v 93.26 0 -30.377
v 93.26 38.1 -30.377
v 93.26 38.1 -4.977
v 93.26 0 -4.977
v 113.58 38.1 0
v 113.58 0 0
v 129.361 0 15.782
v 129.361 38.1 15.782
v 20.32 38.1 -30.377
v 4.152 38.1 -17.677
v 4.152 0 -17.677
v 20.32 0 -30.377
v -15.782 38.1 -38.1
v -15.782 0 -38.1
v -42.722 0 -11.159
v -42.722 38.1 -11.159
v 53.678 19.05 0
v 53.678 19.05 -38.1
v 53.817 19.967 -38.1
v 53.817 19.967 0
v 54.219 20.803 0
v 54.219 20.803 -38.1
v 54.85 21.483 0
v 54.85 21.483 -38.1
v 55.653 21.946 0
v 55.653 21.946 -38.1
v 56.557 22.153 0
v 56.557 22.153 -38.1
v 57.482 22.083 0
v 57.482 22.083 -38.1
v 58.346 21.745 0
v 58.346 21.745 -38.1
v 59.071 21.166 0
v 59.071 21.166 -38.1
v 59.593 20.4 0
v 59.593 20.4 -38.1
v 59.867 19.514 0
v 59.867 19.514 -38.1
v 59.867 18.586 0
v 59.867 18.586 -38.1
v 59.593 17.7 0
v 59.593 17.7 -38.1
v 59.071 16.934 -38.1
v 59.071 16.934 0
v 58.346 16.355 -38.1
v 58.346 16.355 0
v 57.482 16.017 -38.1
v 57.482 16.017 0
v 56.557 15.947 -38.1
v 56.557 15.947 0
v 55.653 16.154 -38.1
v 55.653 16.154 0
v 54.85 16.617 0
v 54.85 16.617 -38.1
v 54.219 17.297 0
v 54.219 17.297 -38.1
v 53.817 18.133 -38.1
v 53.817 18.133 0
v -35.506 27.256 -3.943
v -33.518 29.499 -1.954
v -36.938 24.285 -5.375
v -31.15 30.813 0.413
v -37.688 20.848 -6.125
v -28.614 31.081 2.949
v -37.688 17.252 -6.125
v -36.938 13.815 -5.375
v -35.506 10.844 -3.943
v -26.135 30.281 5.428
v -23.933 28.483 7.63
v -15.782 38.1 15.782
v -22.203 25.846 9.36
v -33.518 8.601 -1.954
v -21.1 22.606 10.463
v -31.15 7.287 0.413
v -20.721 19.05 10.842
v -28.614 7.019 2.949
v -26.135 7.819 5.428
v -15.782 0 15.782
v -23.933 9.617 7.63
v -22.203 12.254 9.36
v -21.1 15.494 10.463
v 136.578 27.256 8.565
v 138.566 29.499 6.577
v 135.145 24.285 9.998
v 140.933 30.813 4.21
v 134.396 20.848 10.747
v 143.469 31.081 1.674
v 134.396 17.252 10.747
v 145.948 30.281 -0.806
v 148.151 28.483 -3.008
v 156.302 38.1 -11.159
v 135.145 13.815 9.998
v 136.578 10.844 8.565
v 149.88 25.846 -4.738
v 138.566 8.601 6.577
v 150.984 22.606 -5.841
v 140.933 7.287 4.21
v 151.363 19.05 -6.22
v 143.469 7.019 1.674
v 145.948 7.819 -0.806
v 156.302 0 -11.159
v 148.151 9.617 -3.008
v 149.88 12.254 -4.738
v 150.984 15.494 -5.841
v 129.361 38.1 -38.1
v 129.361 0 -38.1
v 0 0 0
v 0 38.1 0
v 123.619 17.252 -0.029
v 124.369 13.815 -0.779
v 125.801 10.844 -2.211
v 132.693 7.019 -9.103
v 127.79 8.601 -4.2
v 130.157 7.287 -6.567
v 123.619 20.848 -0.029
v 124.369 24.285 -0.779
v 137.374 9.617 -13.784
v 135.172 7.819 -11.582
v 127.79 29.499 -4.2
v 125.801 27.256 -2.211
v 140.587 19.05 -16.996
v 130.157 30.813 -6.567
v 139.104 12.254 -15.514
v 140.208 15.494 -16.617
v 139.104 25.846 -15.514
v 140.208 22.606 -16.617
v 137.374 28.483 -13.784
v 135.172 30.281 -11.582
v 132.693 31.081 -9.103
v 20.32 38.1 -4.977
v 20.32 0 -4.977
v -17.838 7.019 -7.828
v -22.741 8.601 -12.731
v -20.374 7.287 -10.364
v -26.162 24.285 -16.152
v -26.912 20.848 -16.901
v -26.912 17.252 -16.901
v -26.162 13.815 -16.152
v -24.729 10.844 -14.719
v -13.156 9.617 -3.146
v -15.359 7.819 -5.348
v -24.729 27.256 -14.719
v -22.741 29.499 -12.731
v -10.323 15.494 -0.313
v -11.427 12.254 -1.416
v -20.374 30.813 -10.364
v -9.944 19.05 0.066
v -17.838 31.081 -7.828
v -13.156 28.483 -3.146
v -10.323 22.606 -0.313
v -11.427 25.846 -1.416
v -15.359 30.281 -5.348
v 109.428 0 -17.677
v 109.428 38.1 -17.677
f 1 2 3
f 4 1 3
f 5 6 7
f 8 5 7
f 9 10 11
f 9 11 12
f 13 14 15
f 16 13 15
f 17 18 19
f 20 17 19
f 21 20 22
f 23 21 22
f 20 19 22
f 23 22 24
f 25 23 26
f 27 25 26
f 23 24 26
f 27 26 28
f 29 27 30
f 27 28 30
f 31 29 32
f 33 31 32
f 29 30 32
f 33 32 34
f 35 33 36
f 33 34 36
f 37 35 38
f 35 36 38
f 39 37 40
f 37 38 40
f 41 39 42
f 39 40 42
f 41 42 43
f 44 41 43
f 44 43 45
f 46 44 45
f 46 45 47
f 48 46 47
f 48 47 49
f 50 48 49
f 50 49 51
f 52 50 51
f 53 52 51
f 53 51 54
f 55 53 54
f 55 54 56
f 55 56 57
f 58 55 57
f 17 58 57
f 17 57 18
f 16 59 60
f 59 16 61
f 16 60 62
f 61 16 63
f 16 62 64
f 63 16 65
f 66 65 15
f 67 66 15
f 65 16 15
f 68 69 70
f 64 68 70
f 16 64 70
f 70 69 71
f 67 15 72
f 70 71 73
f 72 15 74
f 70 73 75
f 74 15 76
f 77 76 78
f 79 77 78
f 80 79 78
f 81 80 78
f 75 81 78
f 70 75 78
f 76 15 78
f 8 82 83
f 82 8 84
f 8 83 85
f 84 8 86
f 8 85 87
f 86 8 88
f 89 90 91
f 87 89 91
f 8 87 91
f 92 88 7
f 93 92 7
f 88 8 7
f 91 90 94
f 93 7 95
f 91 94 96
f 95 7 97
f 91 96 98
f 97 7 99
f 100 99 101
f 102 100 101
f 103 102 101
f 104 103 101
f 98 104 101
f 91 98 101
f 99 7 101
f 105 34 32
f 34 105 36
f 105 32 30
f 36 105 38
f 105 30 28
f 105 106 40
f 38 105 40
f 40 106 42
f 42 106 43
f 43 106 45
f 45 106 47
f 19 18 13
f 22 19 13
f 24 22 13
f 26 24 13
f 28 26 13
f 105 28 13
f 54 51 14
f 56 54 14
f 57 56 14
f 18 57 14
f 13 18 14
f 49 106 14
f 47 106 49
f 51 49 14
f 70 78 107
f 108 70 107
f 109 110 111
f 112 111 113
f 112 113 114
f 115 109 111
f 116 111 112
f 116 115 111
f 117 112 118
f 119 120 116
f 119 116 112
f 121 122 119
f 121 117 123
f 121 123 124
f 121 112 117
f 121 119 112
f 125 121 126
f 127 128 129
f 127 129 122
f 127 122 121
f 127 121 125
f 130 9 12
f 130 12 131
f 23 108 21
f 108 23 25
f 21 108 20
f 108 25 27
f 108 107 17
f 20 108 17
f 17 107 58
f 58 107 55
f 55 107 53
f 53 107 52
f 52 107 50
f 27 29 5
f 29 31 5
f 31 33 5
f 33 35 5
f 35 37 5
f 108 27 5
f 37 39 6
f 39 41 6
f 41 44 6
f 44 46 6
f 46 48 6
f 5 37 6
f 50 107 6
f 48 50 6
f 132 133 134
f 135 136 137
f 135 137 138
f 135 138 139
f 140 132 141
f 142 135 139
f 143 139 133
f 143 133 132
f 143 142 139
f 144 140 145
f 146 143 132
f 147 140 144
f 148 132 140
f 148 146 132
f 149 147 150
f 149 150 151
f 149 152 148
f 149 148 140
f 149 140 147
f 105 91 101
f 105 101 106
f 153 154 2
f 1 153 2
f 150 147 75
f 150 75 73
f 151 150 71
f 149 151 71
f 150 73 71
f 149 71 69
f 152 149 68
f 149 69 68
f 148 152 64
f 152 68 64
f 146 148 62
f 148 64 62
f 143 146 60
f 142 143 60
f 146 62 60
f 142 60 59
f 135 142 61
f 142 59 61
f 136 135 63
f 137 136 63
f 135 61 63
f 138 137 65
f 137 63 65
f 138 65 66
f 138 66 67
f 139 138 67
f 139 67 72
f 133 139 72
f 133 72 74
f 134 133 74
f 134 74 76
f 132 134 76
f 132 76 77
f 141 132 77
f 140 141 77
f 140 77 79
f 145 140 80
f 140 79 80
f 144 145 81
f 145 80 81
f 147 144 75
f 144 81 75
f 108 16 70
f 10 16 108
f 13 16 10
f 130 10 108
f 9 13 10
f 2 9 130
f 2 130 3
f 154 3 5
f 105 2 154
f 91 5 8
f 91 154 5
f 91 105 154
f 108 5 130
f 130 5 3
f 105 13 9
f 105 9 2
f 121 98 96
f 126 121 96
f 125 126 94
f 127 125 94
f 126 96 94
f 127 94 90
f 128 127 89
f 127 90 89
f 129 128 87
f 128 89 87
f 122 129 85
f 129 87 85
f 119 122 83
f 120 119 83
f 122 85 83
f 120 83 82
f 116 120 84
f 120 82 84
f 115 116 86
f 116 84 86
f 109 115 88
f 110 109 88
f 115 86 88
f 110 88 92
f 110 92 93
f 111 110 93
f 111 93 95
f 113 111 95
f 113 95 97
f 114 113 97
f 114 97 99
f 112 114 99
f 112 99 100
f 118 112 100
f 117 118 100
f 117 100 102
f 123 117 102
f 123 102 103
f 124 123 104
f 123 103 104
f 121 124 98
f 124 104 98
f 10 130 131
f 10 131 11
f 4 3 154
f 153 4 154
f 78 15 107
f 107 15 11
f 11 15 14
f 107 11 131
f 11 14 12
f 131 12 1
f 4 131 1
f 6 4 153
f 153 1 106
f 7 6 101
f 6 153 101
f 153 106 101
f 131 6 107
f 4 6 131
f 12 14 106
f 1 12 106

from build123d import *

# Parameters (mm, degrees)
BOSS_EXTRUDE1_DEPTH = 38.1
SKETCH2_R           = 12.065
CUT_EXTRUDE1_DEPTH  = 15.24
SKETCH3_R           = 12.065
CUT_EXTRUDE2_DEPTH  = 15.24
CUT_EXTRUDE3_DEPTH  = 38.1
SKETCH6_R           = 3.1115
CUT_EXTRUDE4_DEPTH  = 46.482


with BuildPart() as part:
    # Sketch1 → Boss-Extrude1 (new body)
    with BuildSketch(Plane(origin=(0, 0, 0), x_dir=(1, 0, 0), z_dir=(0, 1, 0))):
        Polygon((0, 0), (113.579665808, 0), (129.361202535, -15.781536726), (156.301970898, 11.159231637), (129.361202535, 38.1), (-15.781536726, 38.1), (-42.72230509, 11.159231637), (-15.781536726, -15.781536726), align=None)
    extrude(amount=BOSS_EXTRUDE1_DEPTH)

    # Sketch2 → Cut-Extrude1 (cut)
    with BuildSketch(Plane(origin=(-15.781536726, 0, 15.781536726), x_dir=(0.7071067811865477, 0, 0.7071067811865475), z_dir=(-0.7071067811865475, 0, 0.7071067811865477))):
        with Locations((-19.05, 19.05)):
            Circle(SKETCH2_R)
    extrude(amount=-CUT_EXTRUDE1_DEPTH, mode=Mode.SUBTRACT)

    # Sketch3 → Cut-Extrude2 (cut)
    with BuildSketch(Plane(origin=(72.57136963, 0, 72.57136963), x_dir=(0.7071067811865478, 0, -0.7071067811865474), z_dir=(0.7071067811865474, 0, 0.7071067811865478))):
        with Locations((99.362951898, 19.05)):
            Circle(SKETCH3_R)
    extrude(amount=-CUT_EXTRUDE2_DEPTH, mode=Mode.SUBTRACT)

    # Sketch5 → Cut-Extrude3 (cut)
    with BuildSketch(Plane(origin=(0, 38.1, 0), x_dir=(1, 0, 0), z_dir=(0, 1, 0))):
        Polygon((4.151555437, 17.676821295), (20.32, 30.376821295), (20.32, 4.976821295), align=None)
        Polygon((93.259665808, 30.376821295), (93.259665808, 4.976821295), (109.428110371, 17.676821295), align=None)
    extrude(amount=-CUT_EXTRUDE3_DEPTH, mode=Mode.SUBTRACT)

    # Sketch6 → Cut-Extrude4 (cut)
    with BuildSketch(Plane(origin=(0, 0, -38.1), x_dir=(-1, 0, 0), z_dir=(0, 0, -1))):
        with Locations((-56.789832904, 19.05)):
            Circle(SKETCH6_R)
    extrude(amount=-CUT_EXTRUDE4_DEPTH, mode=Mode.SUBTRACT)


solid = part.part
